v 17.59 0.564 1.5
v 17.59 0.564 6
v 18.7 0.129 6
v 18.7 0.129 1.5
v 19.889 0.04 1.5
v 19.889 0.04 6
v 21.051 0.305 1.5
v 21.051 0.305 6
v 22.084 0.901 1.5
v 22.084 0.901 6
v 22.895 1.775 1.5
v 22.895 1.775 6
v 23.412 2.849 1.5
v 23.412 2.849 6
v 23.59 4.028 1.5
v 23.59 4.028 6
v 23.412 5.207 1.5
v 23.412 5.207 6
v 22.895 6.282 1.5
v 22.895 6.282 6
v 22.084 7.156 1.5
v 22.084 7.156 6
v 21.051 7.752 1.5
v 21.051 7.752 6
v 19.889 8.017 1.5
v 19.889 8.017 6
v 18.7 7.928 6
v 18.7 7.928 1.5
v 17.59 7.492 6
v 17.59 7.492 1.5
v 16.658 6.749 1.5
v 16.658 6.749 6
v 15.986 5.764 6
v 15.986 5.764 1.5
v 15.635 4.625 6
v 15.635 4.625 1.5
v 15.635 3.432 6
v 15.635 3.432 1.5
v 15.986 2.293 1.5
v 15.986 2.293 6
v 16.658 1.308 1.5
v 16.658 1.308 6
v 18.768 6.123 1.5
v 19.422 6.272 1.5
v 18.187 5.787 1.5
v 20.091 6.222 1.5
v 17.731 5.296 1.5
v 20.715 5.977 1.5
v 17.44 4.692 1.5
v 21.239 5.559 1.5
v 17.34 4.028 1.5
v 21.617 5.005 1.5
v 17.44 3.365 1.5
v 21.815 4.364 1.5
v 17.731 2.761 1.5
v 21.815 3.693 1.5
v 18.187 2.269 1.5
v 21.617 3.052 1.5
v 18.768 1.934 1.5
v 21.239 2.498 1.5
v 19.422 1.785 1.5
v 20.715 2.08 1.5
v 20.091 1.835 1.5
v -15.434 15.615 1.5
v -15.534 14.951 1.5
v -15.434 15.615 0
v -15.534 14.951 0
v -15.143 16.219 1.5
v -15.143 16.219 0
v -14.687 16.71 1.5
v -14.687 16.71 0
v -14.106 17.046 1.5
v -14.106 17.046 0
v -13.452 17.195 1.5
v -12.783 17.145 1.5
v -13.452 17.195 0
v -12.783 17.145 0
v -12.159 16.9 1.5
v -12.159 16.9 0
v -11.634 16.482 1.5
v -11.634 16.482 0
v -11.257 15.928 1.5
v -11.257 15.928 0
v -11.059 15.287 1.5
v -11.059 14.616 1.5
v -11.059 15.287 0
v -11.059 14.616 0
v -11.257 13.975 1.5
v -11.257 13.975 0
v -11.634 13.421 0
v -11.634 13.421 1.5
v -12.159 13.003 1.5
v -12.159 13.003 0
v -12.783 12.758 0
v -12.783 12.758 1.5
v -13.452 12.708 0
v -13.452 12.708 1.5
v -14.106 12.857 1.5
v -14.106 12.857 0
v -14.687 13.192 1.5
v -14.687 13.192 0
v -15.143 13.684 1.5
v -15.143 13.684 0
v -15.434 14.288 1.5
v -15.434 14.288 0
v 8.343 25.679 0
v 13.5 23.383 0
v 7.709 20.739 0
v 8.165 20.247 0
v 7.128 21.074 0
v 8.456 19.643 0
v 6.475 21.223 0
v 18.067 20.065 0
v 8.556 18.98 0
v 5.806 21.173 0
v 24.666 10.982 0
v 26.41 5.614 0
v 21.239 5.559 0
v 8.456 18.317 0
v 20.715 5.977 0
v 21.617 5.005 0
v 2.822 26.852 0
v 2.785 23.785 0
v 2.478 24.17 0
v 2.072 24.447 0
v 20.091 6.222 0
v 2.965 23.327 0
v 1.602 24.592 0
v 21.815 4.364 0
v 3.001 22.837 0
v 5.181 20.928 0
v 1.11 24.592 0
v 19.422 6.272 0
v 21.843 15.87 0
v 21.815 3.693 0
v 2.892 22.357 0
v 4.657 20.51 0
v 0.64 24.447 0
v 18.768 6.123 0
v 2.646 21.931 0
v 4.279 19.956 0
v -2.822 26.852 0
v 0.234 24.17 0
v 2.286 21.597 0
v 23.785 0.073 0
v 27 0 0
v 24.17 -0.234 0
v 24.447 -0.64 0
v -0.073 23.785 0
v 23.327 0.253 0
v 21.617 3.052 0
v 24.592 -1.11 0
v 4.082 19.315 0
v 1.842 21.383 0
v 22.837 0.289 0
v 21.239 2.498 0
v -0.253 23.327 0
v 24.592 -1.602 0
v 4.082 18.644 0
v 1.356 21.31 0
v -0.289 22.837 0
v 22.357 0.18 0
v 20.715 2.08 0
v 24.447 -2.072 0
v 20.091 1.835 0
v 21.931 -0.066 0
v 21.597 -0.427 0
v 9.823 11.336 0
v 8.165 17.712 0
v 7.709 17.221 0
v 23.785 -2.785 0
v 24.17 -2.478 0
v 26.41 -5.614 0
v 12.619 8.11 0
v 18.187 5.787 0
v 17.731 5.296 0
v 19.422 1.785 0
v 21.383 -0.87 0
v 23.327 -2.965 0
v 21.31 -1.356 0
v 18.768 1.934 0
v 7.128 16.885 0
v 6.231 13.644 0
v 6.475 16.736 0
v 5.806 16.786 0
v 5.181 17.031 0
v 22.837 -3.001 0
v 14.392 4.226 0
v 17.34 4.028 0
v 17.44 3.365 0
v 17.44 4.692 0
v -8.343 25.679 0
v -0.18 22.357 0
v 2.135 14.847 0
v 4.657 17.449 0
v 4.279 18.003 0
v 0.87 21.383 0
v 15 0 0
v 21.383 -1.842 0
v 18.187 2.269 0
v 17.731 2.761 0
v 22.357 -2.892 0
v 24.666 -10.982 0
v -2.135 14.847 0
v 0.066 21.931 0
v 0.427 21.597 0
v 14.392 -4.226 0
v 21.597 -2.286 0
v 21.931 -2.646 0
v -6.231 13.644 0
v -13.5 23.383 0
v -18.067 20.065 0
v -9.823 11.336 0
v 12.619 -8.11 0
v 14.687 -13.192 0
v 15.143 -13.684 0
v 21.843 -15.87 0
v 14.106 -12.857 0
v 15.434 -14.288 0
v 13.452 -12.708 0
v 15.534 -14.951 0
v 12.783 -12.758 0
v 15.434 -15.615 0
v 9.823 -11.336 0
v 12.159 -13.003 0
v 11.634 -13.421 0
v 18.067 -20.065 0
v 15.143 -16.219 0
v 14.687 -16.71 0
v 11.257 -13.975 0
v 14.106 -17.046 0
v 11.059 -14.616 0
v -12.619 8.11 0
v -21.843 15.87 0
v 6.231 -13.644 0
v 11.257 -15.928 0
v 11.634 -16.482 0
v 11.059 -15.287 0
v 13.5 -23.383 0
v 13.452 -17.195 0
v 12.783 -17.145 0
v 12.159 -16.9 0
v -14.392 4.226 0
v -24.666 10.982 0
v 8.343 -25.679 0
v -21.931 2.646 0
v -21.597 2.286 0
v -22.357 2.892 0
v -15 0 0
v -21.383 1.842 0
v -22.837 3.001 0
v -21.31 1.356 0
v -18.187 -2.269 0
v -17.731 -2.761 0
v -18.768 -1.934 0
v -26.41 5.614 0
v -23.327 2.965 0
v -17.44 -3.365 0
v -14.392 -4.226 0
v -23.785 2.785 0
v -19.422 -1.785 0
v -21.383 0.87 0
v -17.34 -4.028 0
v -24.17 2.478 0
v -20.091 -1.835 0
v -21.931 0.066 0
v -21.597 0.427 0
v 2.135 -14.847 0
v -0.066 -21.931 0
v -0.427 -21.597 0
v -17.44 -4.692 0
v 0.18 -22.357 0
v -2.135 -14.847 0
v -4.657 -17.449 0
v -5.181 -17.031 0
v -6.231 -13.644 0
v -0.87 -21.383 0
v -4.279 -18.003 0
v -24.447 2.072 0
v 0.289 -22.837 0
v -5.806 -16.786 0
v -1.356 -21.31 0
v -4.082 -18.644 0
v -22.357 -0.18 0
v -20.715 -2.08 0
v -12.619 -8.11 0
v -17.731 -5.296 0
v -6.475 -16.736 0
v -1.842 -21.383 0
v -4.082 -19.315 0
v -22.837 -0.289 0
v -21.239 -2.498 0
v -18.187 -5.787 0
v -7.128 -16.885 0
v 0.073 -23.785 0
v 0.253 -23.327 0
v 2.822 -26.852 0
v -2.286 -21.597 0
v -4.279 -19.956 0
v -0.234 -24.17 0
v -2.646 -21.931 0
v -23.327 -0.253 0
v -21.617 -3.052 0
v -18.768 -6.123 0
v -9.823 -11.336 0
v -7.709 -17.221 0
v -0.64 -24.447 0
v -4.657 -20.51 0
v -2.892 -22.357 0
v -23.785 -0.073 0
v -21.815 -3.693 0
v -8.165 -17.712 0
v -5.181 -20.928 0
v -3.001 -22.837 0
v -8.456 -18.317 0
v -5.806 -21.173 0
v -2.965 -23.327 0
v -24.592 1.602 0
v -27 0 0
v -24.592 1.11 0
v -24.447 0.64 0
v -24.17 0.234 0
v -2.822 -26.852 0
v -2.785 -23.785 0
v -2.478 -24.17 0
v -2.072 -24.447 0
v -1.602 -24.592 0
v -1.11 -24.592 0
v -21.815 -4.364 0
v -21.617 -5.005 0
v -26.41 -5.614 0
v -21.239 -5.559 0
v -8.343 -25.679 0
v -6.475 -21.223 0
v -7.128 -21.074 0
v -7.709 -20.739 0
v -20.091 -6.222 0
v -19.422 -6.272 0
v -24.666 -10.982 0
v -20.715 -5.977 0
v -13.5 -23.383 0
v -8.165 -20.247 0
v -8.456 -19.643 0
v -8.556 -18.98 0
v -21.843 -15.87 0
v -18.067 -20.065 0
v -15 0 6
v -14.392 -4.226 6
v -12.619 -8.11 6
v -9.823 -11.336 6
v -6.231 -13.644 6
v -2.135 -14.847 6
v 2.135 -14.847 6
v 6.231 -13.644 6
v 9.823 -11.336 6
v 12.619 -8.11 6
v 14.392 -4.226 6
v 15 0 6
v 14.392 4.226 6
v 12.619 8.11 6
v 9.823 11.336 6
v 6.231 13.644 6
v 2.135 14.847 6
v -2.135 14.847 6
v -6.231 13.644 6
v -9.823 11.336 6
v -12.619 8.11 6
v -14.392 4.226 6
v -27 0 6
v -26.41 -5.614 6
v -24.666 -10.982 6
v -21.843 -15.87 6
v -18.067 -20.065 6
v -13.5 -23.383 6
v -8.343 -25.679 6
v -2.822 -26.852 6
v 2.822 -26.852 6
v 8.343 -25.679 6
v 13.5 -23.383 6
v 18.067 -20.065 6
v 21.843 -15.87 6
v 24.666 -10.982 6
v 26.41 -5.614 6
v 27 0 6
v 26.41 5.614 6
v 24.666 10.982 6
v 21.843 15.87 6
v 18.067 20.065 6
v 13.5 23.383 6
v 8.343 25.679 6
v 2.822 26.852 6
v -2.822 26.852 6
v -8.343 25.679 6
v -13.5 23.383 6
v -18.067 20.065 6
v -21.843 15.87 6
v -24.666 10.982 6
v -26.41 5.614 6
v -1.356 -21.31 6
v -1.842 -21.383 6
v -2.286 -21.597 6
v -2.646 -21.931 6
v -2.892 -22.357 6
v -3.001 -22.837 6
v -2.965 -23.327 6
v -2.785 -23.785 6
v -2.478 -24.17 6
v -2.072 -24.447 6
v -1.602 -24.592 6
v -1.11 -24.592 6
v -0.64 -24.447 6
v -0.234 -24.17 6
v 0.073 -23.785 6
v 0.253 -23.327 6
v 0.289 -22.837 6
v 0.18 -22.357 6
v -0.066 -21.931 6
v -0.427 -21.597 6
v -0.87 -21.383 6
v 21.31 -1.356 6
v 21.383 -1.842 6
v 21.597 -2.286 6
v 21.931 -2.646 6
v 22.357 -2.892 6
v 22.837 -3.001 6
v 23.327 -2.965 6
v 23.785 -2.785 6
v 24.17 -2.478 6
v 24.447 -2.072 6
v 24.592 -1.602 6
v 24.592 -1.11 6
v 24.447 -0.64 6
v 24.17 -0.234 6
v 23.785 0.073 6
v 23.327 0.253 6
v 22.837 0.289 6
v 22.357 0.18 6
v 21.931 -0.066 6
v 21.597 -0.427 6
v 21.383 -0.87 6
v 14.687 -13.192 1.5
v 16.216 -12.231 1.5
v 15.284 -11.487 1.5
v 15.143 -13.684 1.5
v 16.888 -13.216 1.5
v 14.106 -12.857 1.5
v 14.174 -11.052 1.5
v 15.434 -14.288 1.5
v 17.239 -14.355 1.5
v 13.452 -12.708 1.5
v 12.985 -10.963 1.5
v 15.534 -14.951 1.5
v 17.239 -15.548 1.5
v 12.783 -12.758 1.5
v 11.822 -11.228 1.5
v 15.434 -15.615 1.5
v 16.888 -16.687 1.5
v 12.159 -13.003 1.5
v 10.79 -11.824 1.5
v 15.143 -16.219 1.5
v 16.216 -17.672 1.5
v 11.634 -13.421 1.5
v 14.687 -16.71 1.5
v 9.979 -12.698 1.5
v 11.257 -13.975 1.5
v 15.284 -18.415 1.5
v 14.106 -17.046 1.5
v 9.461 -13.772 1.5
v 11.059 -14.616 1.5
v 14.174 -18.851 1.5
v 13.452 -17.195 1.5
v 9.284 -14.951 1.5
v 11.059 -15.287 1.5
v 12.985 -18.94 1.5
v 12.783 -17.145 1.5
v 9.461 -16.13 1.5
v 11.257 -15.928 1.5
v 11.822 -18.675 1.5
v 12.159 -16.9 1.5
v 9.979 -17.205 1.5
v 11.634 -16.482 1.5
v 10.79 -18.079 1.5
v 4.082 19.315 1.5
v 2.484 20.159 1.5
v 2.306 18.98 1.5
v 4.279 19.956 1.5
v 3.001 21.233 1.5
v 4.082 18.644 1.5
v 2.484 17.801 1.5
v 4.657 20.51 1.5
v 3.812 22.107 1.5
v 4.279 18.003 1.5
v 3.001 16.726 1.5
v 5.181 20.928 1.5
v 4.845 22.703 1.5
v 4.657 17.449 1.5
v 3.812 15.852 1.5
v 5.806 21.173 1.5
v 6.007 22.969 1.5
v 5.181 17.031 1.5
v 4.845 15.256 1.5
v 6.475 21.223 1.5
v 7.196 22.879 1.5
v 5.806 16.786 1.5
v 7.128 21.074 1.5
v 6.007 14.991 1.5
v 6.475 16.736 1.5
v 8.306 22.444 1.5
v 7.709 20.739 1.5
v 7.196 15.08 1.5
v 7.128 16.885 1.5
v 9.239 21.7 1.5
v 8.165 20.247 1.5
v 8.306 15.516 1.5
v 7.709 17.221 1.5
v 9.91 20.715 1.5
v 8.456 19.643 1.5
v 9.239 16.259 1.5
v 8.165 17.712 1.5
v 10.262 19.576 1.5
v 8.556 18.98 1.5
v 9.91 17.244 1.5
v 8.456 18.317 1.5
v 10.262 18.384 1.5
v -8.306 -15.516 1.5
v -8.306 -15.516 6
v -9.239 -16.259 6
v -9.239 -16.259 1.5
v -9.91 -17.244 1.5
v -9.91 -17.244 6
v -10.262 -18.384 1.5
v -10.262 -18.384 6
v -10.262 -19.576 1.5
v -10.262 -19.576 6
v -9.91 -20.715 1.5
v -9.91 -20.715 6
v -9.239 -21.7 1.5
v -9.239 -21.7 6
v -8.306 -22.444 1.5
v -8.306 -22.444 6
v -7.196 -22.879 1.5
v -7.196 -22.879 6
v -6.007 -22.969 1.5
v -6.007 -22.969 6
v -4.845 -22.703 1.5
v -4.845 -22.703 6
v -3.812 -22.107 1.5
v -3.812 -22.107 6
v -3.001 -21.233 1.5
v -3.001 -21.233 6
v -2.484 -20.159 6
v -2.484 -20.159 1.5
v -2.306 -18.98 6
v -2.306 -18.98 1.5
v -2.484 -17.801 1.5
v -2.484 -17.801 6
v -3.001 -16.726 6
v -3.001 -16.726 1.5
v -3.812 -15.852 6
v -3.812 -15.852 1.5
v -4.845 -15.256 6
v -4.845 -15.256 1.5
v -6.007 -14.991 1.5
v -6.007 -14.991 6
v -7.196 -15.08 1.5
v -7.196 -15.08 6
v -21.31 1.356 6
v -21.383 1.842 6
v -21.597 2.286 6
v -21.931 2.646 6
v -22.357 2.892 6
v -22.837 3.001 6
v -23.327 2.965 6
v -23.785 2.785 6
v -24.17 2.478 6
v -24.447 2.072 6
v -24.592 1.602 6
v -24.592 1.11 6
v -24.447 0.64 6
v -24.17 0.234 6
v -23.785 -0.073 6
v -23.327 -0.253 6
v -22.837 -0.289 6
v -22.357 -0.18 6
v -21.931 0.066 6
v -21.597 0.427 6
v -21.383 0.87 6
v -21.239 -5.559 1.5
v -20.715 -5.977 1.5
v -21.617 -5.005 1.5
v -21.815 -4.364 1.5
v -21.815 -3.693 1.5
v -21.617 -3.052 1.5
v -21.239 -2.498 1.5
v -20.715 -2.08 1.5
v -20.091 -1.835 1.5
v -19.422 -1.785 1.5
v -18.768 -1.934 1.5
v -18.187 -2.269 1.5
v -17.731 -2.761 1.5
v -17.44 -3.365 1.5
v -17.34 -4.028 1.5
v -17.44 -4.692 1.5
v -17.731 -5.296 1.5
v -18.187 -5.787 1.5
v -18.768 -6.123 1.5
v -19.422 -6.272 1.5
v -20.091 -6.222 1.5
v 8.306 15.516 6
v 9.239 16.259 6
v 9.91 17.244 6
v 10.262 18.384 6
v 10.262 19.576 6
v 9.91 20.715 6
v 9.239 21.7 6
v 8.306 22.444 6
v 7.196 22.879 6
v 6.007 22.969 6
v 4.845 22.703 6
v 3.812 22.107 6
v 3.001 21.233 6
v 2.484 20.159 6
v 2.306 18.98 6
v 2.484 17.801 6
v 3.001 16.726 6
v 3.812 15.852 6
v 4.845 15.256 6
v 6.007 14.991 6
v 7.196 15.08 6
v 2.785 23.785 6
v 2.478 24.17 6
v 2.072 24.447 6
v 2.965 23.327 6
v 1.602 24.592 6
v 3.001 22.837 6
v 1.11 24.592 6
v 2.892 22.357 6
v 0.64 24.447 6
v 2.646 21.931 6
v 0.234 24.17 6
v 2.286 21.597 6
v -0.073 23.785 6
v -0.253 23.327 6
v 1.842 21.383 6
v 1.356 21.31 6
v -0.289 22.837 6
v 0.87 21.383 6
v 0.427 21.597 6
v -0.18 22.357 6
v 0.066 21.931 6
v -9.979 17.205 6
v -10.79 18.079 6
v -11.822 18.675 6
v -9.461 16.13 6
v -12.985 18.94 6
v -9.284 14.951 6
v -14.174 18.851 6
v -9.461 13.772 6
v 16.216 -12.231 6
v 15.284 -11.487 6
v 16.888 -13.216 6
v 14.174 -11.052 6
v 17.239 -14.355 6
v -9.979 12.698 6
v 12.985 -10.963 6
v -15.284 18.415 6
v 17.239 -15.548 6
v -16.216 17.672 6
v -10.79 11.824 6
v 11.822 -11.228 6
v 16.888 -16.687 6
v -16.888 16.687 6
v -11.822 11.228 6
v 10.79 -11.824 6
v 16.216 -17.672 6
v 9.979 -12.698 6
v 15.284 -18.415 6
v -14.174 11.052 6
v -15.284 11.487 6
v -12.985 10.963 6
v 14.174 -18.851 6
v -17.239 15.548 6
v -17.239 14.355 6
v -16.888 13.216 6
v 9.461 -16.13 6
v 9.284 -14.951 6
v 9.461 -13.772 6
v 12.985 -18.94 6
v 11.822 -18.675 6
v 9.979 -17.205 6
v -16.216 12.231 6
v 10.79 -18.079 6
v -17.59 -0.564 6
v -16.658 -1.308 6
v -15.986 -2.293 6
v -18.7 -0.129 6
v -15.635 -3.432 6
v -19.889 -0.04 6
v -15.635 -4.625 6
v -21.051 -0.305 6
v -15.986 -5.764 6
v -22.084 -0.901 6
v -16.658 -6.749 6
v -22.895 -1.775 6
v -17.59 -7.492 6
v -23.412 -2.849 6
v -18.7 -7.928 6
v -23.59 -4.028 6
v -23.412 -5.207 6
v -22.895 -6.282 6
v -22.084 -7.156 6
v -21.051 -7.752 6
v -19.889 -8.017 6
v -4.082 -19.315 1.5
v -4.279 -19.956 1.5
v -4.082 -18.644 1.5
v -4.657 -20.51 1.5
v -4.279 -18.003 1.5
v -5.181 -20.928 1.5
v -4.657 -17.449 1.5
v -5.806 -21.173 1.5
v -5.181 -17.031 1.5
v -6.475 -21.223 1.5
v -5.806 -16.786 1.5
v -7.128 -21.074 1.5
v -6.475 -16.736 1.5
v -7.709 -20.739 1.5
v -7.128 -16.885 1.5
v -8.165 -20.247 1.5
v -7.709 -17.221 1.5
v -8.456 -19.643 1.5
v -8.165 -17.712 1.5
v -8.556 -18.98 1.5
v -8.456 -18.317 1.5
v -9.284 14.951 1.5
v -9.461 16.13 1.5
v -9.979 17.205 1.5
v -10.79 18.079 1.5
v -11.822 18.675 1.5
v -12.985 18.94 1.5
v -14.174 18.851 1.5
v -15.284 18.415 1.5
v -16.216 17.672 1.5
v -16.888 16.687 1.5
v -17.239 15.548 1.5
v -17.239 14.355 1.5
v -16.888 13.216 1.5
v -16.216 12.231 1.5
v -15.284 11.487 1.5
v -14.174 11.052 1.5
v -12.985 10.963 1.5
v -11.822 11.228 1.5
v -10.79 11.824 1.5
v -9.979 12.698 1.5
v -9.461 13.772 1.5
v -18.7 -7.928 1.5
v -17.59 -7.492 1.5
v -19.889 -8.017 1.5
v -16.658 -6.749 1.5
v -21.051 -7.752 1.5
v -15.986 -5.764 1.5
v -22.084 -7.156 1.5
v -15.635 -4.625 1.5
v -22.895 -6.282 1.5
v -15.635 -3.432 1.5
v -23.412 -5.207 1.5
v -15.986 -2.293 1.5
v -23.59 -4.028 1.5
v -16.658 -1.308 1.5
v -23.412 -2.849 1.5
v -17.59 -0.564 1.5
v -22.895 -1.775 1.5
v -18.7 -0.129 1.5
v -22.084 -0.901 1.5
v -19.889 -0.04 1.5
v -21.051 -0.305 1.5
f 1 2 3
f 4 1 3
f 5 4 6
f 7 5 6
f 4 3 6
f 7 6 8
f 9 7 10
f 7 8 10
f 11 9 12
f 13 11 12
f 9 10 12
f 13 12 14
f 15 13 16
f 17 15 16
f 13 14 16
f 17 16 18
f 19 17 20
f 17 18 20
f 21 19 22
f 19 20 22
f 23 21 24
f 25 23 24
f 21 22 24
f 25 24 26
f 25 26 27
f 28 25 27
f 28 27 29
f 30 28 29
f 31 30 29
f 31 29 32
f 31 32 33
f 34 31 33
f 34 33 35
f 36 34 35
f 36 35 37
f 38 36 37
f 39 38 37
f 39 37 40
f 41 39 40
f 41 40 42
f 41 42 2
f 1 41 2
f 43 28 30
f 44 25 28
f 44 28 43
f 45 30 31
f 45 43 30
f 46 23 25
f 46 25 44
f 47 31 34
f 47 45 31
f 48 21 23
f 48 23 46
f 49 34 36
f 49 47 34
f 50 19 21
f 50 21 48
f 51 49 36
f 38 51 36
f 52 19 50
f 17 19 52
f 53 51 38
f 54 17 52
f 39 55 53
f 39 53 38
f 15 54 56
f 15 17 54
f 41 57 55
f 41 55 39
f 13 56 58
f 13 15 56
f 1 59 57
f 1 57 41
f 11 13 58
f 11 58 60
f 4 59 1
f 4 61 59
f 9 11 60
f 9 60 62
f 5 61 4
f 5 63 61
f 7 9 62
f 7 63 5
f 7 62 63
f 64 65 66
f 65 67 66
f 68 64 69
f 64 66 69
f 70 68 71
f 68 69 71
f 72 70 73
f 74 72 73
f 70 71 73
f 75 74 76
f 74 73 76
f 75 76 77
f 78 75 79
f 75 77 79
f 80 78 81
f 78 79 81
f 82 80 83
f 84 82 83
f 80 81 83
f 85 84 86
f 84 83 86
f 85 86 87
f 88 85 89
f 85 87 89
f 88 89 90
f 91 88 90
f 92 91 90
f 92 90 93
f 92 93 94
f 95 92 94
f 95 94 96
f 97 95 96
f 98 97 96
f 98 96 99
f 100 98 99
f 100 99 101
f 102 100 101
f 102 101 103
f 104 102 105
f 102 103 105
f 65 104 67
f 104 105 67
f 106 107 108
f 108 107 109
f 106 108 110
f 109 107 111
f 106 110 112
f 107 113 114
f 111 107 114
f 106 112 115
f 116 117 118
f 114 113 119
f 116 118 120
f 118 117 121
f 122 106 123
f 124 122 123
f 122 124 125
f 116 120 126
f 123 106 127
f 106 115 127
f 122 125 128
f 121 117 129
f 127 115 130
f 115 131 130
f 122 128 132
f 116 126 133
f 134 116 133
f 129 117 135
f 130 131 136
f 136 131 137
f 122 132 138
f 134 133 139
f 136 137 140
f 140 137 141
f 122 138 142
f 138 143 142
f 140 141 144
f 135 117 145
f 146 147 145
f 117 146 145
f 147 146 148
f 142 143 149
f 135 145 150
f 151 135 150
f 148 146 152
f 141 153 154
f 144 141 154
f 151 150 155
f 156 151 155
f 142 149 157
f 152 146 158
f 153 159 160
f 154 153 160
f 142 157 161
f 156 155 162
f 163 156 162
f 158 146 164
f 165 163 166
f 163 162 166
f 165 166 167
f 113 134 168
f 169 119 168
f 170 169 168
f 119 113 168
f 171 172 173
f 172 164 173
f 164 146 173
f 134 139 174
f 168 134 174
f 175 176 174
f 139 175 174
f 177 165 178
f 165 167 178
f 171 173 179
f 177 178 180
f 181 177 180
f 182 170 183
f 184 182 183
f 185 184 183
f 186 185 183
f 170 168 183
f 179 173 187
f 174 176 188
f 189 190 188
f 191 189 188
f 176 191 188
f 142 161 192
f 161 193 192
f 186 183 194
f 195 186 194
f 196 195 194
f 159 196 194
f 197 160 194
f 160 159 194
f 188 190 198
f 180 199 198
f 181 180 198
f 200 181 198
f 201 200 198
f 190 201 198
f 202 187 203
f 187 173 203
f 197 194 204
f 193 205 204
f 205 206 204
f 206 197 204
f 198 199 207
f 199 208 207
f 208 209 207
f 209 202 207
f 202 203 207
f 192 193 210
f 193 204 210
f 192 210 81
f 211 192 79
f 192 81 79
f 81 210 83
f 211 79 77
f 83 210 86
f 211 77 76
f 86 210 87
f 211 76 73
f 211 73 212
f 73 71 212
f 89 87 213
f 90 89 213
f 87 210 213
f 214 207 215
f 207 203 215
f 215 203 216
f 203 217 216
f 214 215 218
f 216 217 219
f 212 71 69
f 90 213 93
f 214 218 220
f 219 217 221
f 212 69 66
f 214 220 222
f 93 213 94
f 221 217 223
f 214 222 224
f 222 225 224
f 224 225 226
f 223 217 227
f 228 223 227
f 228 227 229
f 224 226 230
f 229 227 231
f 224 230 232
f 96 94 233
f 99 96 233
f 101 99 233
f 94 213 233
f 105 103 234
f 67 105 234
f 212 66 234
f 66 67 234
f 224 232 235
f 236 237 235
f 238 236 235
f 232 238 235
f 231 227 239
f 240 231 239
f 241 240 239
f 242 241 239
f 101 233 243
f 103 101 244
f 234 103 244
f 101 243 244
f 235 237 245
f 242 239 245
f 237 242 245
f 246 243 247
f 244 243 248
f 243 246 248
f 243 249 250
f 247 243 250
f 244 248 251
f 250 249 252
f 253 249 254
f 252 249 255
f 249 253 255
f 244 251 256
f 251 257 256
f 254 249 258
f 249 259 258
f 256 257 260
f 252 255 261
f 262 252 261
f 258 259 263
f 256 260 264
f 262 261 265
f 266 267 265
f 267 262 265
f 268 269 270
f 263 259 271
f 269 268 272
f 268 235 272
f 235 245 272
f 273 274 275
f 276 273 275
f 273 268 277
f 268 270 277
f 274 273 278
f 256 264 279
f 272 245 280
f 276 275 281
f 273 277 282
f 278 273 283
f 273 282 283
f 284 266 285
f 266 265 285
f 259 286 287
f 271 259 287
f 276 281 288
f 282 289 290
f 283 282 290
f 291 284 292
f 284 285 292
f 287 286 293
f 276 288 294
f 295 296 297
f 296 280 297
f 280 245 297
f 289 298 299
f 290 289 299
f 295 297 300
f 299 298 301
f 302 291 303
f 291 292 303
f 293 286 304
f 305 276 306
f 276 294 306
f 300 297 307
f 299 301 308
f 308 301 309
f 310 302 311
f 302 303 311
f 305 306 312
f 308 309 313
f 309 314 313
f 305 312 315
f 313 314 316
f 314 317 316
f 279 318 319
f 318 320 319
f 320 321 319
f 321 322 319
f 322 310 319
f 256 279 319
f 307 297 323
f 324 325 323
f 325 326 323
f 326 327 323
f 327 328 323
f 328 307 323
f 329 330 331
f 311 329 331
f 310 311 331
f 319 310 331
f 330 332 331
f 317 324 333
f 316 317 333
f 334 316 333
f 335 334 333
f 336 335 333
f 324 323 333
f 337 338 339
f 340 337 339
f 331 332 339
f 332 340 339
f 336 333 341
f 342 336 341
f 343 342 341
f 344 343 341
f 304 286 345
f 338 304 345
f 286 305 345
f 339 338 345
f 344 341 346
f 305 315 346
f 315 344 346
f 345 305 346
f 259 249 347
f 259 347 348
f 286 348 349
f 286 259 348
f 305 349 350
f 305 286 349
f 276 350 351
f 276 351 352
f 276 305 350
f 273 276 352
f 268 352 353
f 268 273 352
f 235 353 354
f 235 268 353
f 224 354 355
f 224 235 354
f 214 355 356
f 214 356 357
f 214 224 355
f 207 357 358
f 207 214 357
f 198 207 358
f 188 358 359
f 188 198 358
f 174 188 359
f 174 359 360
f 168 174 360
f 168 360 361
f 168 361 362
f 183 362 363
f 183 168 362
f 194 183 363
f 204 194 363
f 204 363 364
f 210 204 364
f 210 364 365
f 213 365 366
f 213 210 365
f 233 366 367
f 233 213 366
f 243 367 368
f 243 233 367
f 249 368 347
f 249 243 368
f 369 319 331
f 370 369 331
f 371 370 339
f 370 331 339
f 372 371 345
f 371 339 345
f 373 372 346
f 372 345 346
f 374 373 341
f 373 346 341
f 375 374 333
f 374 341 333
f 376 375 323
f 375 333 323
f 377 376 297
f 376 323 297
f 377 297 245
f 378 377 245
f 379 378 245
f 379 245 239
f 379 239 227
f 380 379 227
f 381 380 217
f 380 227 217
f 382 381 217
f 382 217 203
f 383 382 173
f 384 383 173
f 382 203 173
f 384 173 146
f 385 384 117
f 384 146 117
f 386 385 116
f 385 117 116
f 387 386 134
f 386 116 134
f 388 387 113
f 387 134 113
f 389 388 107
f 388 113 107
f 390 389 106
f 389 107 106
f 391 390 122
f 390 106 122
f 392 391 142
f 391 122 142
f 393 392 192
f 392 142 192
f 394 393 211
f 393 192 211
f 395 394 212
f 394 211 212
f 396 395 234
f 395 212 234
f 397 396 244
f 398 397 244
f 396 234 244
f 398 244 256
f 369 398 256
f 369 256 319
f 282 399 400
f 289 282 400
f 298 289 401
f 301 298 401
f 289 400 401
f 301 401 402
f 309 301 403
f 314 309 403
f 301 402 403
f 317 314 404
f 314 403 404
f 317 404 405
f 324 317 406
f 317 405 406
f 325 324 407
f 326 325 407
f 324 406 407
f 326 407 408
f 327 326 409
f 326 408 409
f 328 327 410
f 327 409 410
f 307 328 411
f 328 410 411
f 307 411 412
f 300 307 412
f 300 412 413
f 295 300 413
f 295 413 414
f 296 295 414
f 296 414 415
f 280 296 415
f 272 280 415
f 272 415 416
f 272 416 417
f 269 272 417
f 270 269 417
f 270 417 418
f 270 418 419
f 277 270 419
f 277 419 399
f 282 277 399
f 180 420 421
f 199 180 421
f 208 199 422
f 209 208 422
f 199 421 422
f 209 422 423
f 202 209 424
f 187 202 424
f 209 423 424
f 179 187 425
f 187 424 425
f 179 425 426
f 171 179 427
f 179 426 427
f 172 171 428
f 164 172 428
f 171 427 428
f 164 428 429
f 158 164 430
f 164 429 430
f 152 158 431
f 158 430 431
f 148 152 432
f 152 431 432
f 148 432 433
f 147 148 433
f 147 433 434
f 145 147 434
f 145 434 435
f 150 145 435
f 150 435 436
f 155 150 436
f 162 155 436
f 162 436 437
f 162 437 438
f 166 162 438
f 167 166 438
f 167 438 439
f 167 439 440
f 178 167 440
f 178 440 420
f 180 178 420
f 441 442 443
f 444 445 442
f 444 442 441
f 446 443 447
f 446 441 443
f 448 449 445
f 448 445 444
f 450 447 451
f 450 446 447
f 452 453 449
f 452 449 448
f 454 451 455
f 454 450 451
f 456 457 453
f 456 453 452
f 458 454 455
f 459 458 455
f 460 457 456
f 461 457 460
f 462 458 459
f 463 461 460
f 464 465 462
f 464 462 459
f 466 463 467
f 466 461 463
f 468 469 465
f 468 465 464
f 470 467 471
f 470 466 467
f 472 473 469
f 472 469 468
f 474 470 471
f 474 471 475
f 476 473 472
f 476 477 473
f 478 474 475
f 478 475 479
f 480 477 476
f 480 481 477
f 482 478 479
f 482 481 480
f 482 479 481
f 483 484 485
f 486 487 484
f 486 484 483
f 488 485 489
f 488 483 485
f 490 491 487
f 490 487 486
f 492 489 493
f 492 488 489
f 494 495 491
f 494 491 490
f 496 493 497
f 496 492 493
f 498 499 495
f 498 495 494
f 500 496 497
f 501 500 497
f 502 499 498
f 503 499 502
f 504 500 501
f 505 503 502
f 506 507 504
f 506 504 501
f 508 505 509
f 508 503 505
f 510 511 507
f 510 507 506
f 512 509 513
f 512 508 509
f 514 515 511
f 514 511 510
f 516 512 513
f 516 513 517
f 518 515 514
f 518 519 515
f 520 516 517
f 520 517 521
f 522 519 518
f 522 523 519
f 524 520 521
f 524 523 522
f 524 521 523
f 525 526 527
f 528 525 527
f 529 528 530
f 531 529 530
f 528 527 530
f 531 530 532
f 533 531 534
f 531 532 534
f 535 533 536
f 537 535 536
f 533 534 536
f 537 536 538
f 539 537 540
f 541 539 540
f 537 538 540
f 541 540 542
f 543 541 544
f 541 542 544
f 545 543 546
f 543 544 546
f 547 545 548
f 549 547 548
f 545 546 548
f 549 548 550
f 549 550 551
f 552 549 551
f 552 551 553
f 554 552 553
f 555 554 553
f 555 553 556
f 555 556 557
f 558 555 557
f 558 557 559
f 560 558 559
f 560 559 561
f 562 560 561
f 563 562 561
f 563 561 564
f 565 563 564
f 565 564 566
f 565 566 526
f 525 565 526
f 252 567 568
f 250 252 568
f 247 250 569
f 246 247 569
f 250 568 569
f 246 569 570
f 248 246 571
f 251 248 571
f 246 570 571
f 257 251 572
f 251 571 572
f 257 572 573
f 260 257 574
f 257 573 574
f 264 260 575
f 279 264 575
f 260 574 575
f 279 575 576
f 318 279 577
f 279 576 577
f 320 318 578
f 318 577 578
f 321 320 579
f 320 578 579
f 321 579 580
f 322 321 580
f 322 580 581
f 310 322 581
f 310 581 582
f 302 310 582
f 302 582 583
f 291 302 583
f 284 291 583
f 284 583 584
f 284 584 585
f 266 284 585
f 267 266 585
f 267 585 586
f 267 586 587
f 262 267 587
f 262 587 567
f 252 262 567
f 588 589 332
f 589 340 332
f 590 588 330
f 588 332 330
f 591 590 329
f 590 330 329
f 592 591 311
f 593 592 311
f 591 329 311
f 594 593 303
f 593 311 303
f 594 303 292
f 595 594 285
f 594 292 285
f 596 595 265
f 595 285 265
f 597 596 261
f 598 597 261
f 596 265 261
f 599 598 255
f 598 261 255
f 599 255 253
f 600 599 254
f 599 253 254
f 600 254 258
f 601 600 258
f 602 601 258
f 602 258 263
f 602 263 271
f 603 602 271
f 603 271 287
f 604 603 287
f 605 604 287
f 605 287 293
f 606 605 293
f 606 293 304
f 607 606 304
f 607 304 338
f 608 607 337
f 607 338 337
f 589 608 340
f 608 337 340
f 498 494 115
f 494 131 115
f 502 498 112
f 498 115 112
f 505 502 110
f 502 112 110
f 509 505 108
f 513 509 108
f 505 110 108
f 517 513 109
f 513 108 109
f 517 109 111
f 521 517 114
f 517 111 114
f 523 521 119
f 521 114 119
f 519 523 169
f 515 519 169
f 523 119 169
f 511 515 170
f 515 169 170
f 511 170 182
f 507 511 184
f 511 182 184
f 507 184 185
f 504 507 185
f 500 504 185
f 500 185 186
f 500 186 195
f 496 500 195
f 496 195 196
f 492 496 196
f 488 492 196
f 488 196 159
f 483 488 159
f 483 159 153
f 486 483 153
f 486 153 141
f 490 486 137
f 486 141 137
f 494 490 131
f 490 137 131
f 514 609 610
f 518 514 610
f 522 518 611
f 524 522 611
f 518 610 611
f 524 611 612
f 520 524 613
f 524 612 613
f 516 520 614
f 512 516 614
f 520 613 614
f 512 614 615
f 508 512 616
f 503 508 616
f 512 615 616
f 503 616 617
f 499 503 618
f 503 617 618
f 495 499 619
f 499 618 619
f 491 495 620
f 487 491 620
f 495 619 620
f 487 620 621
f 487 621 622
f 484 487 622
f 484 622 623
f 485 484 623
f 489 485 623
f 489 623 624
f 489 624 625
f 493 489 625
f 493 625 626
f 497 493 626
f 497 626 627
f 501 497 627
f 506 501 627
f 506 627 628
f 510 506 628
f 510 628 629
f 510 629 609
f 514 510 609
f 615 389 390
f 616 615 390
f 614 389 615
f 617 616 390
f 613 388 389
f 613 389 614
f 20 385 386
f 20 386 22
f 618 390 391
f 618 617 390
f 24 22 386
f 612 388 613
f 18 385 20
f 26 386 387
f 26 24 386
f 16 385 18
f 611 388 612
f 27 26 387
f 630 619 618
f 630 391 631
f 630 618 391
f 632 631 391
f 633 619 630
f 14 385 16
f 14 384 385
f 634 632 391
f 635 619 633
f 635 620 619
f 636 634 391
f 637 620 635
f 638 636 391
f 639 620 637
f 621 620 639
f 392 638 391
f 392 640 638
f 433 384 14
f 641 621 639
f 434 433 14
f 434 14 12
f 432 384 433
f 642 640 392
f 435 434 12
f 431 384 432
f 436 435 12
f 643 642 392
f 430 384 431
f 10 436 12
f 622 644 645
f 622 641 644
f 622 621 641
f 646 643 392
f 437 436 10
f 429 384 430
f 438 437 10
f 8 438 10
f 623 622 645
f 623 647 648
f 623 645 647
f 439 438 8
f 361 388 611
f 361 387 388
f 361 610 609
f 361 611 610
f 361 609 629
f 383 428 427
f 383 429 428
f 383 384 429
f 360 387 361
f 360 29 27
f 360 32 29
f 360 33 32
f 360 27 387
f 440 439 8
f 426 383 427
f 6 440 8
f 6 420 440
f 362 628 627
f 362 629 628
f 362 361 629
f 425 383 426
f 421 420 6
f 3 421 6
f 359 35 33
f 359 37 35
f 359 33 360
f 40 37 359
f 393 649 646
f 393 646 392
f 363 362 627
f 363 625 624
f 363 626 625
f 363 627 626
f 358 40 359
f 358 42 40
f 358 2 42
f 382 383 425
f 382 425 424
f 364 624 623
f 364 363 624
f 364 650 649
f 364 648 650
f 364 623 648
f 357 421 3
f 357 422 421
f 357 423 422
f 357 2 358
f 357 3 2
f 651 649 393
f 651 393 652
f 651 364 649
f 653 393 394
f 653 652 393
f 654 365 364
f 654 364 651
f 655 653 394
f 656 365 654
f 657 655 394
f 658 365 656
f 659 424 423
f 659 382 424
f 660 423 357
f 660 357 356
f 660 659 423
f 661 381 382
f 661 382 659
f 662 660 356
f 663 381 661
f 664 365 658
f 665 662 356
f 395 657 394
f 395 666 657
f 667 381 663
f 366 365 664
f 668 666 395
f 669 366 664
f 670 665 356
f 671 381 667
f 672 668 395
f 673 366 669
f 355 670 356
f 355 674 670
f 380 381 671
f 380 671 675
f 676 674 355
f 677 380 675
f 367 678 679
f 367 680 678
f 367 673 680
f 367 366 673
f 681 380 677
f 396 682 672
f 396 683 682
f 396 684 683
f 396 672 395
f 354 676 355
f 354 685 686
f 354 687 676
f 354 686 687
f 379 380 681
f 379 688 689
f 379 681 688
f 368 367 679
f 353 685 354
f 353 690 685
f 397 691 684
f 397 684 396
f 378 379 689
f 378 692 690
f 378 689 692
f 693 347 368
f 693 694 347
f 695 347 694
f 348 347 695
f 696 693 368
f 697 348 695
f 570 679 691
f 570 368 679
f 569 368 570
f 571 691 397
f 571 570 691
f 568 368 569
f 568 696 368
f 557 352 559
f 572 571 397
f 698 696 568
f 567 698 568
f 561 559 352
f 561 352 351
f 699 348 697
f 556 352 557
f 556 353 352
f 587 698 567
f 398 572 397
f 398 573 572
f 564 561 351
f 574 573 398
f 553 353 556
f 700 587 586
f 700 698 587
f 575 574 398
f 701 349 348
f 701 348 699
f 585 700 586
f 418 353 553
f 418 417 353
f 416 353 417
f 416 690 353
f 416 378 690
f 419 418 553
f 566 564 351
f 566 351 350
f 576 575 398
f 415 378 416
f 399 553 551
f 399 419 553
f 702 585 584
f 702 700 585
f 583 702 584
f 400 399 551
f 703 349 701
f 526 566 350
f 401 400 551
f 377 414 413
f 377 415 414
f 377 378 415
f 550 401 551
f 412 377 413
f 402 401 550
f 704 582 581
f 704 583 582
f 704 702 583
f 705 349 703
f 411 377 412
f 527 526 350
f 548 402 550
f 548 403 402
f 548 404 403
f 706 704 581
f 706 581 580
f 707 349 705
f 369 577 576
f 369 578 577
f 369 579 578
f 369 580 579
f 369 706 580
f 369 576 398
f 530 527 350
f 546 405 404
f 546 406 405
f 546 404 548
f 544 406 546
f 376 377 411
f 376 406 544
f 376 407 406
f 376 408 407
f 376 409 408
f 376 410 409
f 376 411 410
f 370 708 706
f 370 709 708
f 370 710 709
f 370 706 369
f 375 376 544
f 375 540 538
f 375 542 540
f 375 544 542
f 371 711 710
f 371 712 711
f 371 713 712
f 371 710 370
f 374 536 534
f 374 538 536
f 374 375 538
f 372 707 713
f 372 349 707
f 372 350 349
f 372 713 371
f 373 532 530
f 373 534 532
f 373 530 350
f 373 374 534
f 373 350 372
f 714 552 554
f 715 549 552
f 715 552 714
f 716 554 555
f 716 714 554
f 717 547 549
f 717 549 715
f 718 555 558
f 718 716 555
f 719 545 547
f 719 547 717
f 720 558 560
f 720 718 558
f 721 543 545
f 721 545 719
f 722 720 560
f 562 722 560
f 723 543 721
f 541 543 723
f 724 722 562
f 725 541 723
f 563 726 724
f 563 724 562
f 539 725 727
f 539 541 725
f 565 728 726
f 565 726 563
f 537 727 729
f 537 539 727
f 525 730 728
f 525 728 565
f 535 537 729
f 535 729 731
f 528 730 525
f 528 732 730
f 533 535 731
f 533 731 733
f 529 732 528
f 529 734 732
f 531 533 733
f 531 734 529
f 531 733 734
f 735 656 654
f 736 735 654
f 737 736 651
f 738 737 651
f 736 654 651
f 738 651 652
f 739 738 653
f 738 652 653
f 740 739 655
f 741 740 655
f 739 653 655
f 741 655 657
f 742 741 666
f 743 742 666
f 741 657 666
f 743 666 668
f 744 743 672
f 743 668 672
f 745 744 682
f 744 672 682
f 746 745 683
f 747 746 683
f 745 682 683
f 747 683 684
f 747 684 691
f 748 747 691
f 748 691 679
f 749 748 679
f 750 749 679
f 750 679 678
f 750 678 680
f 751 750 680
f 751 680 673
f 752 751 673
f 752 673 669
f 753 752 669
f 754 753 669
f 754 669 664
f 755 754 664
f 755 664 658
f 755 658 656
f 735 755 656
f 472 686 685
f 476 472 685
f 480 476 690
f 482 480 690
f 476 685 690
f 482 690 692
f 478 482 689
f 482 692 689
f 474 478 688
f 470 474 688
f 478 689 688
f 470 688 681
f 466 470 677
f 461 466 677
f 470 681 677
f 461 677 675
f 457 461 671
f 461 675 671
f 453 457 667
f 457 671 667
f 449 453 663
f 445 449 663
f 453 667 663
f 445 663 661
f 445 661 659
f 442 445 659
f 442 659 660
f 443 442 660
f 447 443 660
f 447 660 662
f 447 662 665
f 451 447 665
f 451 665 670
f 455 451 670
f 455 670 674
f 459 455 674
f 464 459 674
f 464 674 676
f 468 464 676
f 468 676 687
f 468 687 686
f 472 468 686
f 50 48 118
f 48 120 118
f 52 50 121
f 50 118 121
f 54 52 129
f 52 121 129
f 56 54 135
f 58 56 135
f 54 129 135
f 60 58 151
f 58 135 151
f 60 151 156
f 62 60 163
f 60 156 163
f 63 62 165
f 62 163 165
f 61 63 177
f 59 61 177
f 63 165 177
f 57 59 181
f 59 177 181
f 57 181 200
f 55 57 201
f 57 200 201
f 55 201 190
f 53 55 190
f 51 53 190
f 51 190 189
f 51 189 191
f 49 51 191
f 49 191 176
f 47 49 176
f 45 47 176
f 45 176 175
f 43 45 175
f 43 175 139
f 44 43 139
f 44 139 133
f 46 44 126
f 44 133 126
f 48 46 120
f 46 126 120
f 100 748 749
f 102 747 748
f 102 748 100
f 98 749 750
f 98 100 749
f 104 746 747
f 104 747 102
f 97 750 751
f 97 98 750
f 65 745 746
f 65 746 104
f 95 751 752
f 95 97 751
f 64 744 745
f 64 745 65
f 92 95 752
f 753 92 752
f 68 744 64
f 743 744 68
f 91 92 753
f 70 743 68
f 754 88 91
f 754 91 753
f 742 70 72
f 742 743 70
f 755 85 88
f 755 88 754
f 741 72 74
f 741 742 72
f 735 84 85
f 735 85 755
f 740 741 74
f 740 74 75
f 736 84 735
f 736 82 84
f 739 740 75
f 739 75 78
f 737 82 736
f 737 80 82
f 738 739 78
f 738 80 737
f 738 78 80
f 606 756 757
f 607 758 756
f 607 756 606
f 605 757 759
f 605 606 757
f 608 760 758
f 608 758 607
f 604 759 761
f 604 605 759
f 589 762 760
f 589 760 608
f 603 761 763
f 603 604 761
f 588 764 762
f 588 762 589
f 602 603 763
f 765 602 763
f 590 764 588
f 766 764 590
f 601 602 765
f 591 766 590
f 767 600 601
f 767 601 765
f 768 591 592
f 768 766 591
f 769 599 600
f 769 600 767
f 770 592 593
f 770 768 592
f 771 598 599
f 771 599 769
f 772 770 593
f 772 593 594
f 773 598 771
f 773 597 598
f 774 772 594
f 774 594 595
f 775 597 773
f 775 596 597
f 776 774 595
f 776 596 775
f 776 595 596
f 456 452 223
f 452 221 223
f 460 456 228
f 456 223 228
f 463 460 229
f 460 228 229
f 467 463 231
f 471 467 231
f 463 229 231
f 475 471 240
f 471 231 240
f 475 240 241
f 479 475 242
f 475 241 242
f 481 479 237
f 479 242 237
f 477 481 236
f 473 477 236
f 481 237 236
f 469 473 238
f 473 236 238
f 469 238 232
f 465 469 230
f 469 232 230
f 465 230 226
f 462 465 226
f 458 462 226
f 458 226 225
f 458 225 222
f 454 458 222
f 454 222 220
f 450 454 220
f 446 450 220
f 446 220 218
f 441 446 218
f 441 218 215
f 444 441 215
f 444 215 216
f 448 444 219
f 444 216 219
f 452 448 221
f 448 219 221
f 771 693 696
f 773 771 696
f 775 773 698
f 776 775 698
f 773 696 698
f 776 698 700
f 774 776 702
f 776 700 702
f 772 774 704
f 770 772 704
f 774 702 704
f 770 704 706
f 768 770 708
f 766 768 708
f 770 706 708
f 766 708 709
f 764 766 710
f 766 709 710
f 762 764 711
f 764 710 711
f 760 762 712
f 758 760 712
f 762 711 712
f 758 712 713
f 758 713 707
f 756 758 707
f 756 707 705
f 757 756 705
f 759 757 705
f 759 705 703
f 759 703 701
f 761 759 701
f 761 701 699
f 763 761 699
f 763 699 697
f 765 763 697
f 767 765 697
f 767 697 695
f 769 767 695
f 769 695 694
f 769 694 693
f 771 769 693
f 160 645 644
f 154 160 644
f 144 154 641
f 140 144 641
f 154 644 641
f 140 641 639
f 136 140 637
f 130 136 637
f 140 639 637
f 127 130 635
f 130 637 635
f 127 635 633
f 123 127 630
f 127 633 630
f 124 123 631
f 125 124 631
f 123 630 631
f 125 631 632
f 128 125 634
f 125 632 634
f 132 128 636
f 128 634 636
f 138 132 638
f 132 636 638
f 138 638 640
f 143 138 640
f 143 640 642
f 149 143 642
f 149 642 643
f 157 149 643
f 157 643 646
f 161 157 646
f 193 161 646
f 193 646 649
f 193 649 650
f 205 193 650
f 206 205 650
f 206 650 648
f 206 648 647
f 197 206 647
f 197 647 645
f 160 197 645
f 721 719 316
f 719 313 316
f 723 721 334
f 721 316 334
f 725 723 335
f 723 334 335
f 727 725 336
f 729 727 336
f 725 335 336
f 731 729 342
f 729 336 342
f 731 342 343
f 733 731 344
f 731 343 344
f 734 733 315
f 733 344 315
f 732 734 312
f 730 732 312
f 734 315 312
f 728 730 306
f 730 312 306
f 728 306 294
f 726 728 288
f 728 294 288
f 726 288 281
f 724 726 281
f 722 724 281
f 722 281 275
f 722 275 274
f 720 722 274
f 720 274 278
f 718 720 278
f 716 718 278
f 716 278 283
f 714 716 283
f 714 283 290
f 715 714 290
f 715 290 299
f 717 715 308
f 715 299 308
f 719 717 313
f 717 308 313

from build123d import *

# Parameters (mm, degrees)
ESQUISSE5_R                                     = 27
ESQUISSE5_R_2                                   = 15
BASE_EXTRUSION_DEPTH                            = 6
TROU_TARAUD_M4X0_71_D                           = 3.3
R_P_TITION_CIRCULAIRE1_COUNT                    = 4
CHAMBRAGE_POUR_VIS_T_TE_CYLINDRIQUE_D           = 4.5
CHAMBRAGE_POUR_VIS_T_TE_CYLINDRIQUE_CBORE_D     = 8
CHAMBRAGE_POUR_VIS_T_TE_CYLINDRIQUE_CBORE_DEPTH = 4.5
R_P_TITION_CIRCULAIRE2_COUNT                    = 6


with BuildPart() as part:
    # Esquisse5 → Base-Extrusion (new body)
    with BuildSketch(Plane.XY):
        with Locations(Location((0, 0, 0), (0, 0, 180))):
            Circle(ESQUISSE5_R)
        with Locations(Location((0, 0, 0), (0, 0, 180))):
            Circle(ESQUISSE5_R_2, mode=Mode.SUBTRACT)
    extrude(amount=BASE_EXTRUSION_DEPTH)

    # Trou taraudé M4x0.71 (through all)
    with Locations(Plane(origin=(0, 0, 0), x_dir=(-1, 0, 0), z_dir=(0, 0, -1))):
        with Locations((22.959989216, 1.356058707)):
            trou_taraud_m4x0_71 = Hole(TROU_TARAUD_M4X0_71_D / 2)

    # Répétition circulaire1: Trou taraudé M4x0.71 ×4 about axis
    r_p_tition_circulaire1_axis = Axis((0, 0, 0), (0, 0, -1))
    for i in range(1, R_P_TITION_CIRCULAIRE1_COUNT):
        add(trou_taraud_m4x0_71.rotate(r_p_tition_circulaire1_axis, i * 360 / R_P_TITION_CIRCULAIRE1_COUNT), mode=Mode.SUBTRACT)

    # Chambrage pour vis à tête cylindrique à 6 pans creux (vis CHC) M41 (through all)
    with Locations(Plane.XY.offset(6)):
        with Locations((-13.28372675, 14.951341198)):
            chambrage_pour_vis_t_te_cylindrique = CounterBoreHole(CHAMBRAGE_POUR_VIS_T_TE_CYLINDRIQUE_D / 2, CHAMBRAGE_POUR_VIS_T_TE_CYLINDRIQUE_CBORE_D / 2, CHAMBRAGE_POUR_VIS_T_TE_CYLINDRIQUE_CBORE_DEPTH)

    # Répétition circulaire2: Chambrage pour vis à tête cylindrique à 6 pans creux (vis CHC) M41 ×6 about axis
    r_p_tition_circulaire2_axis = Axis((0, 0, 0), (0, 0, -1))
    for i in range(1, R_P_TITION_CIRCULAIRE2_COUNT):
        add(chambrage_pour_vis_t_te_cylindrique.rotate(r_p_tition_circulaire2_axis, i * 360 / R_P_TITION_CIRCULAIRE2_COUNT), mode=Mode.SUBTRACT)


solid = part.part
